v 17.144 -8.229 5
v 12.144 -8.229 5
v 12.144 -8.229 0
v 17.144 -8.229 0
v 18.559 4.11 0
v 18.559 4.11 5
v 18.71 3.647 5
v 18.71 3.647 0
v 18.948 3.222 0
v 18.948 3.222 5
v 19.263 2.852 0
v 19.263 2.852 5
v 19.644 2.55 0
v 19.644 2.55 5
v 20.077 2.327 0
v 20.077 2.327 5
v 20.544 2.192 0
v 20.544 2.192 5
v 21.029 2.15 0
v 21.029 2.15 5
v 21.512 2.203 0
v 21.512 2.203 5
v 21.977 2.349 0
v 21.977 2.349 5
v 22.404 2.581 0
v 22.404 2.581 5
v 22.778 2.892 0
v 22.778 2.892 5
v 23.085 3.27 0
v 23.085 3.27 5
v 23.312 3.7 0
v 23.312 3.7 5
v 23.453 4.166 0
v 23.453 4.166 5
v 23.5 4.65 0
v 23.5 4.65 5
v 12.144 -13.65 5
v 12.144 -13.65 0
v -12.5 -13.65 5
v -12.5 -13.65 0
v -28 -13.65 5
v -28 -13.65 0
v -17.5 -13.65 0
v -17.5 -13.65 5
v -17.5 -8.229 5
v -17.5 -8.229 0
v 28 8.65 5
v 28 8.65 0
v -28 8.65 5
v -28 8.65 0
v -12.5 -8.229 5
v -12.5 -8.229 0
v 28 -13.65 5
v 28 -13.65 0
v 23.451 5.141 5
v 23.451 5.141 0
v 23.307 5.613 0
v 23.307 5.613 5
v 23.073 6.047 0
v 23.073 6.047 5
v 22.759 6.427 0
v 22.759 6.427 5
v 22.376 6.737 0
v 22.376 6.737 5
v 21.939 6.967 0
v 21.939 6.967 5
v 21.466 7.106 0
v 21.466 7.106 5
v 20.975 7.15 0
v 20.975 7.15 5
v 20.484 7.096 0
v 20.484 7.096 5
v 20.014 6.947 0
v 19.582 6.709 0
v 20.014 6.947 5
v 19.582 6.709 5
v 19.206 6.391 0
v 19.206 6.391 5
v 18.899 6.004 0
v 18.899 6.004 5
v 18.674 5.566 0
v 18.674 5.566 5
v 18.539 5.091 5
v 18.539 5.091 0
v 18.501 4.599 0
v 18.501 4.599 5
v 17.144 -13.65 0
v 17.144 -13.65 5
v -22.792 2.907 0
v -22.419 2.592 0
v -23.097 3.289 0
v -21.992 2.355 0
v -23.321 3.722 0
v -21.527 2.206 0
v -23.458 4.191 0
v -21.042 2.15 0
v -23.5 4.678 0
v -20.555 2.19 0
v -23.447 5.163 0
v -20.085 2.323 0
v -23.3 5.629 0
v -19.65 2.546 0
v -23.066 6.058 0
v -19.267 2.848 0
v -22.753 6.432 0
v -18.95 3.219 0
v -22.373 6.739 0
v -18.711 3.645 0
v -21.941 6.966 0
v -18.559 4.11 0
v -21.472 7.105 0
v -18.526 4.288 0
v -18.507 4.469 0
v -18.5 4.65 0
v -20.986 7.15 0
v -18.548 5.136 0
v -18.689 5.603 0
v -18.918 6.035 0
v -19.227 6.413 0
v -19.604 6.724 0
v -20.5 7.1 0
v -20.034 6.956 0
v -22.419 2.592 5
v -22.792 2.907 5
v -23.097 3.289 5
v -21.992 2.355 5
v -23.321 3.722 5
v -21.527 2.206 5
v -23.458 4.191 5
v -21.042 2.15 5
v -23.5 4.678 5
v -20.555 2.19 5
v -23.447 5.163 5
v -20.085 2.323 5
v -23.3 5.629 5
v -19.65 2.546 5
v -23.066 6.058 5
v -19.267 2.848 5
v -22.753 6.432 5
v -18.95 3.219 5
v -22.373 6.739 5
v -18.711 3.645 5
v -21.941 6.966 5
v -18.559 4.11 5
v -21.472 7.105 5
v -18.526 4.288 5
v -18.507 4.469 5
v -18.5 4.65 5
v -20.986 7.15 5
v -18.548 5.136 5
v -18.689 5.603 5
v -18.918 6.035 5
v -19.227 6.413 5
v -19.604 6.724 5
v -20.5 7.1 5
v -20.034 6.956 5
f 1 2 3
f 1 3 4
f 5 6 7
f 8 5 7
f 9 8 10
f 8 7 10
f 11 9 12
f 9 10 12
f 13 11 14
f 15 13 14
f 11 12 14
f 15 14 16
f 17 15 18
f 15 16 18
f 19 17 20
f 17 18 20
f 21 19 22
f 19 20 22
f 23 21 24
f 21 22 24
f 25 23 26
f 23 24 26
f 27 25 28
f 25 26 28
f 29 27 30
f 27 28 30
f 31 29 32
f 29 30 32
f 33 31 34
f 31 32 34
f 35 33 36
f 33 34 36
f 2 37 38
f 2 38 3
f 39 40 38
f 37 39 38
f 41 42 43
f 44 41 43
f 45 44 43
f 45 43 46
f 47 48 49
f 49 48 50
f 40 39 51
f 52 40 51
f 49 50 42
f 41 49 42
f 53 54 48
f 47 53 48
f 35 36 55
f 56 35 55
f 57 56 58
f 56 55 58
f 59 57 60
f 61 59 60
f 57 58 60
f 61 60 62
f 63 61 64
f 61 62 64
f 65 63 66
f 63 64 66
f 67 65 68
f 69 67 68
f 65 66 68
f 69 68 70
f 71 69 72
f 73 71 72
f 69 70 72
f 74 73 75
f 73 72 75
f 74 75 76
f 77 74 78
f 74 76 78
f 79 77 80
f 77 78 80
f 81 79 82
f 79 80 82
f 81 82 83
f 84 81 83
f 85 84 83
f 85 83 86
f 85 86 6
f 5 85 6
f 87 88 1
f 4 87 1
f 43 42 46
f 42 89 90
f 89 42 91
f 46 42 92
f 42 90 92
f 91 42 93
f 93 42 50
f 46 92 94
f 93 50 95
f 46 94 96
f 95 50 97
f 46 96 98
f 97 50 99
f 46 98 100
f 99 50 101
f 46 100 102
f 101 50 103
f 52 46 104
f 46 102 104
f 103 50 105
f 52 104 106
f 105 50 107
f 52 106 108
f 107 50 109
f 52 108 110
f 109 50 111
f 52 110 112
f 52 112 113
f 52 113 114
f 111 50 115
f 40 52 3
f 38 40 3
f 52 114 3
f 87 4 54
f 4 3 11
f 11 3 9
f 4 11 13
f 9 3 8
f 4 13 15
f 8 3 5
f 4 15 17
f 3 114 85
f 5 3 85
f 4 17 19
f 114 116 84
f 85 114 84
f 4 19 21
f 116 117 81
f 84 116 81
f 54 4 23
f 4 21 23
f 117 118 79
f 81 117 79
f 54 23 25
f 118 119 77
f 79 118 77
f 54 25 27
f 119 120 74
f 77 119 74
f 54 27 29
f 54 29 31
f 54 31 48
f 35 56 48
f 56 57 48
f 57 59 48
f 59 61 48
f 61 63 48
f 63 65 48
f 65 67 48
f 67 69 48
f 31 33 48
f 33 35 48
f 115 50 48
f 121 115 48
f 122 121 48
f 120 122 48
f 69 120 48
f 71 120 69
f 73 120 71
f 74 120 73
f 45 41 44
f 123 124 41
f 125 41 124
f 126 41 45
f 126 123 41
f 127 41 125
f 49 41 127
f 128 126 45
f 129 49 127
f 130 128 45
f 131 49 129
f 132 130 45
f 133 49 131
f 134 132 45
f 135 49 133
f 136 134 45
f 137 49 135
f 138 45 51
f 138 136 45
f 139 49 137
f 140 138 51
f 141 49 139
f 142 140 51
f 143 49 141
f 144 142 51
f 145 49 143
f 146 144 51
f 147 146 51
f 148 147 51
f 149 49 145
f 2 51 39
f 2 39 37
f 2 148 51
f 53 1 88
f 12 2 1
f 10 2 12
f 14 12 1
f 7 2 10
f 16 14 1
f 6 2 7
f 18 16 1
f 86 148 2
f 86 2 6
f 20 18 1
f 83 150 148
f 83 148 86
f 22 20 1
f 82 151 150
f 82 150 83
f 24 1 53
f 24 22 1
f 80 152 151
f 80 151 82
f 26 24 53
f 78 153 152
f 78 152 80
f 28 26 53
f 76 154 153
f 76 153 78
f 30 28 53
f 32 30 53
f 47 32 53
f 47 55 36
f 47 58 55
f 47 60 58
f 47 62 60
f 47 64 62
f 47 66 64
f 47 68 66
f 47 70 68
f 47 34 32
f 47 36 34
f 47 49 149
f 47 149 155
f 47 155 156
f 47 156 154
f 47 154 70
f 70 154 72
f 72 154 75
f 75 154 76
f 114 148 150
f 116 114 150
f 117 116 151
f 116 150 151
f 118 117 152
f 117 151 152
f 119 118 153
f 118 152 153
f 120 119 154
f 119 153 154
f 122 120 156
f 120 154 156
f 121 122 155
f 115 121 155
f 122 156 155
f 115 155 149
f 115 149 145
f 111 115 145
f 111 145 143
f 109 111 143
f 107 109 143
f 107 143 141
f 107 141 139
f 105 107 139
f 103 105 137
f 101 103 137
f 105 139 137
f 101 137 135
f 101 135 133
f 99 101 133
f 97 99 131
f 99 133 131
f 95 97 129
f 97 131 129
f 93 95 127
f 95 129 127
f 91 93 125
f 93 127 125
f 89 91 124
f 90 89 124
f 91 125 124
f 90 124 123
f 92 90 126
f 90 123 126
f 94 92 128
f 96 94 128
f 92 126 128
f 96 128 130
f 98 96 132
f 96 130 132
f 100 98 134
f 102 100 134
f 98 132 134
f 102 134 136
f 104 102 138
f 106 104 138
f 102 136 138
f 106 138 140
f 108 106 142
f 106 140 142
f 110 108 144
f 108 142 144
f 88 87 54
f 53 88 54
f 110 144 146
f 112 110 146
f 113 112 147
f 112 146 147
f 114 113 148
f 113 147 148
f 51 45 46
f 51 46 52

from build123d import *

# Parameters (mm, degrees)
F1_DEPTH = 5
F3_DEPTH = 5
F4_W     = 5
F4_H     = 5.42134
F5_DEPTH = 5


with BuildPart() as f1:
    # F0 (on Top) → F1 (new body)
    with BuildSketch(Plane.XY):
        Polygon((28, -8.65), (28, 8.65), (-28, 8.65), (-28, -8.65), (-28, -13.65), (28, -13.65), align=None)
    extrude(amount=F1_DEPTH)

    # F2 (on face) → F3 (cut)
    with BuildSketch(Plane.XY.offset(5)):
        with BuildLine():
            ThreePointArc((-18.559123, 4.10952), (-18.514825, 4.378148), (-18.5, 4.65))
            ThreePointArc((-18.5, 4.65), (-23.485175, 4.921852), (-18.559123, 4.10952))
        make_face()
        with BuildLine():
            ThreePointArc((23.5, 4.65), (20.728148, 7.135175), (18.559123, 4.10952))
            ThreePointArc((18.559123, 4.10952), (21.271852, 2.164825), (23.5, 4.65))
        make_face()
    extrude(amount=-F3_DEPTH, mode=Mode.SUBTRACT)

    # F4 (on face) → F5 (cut)
    with BuildSketch(Plane.XY.offset(5)):
        with Locations((-15, -10.93933)):
            Rectangle(F4_W, F4_H)
        with Locations((14.643573, -10.93933)):
            Rectangle(F4_W, F4_H)
    extrude(amount=-F5_DEPTH, mode=Mode.SUBTRACT)


solid = f1.part
